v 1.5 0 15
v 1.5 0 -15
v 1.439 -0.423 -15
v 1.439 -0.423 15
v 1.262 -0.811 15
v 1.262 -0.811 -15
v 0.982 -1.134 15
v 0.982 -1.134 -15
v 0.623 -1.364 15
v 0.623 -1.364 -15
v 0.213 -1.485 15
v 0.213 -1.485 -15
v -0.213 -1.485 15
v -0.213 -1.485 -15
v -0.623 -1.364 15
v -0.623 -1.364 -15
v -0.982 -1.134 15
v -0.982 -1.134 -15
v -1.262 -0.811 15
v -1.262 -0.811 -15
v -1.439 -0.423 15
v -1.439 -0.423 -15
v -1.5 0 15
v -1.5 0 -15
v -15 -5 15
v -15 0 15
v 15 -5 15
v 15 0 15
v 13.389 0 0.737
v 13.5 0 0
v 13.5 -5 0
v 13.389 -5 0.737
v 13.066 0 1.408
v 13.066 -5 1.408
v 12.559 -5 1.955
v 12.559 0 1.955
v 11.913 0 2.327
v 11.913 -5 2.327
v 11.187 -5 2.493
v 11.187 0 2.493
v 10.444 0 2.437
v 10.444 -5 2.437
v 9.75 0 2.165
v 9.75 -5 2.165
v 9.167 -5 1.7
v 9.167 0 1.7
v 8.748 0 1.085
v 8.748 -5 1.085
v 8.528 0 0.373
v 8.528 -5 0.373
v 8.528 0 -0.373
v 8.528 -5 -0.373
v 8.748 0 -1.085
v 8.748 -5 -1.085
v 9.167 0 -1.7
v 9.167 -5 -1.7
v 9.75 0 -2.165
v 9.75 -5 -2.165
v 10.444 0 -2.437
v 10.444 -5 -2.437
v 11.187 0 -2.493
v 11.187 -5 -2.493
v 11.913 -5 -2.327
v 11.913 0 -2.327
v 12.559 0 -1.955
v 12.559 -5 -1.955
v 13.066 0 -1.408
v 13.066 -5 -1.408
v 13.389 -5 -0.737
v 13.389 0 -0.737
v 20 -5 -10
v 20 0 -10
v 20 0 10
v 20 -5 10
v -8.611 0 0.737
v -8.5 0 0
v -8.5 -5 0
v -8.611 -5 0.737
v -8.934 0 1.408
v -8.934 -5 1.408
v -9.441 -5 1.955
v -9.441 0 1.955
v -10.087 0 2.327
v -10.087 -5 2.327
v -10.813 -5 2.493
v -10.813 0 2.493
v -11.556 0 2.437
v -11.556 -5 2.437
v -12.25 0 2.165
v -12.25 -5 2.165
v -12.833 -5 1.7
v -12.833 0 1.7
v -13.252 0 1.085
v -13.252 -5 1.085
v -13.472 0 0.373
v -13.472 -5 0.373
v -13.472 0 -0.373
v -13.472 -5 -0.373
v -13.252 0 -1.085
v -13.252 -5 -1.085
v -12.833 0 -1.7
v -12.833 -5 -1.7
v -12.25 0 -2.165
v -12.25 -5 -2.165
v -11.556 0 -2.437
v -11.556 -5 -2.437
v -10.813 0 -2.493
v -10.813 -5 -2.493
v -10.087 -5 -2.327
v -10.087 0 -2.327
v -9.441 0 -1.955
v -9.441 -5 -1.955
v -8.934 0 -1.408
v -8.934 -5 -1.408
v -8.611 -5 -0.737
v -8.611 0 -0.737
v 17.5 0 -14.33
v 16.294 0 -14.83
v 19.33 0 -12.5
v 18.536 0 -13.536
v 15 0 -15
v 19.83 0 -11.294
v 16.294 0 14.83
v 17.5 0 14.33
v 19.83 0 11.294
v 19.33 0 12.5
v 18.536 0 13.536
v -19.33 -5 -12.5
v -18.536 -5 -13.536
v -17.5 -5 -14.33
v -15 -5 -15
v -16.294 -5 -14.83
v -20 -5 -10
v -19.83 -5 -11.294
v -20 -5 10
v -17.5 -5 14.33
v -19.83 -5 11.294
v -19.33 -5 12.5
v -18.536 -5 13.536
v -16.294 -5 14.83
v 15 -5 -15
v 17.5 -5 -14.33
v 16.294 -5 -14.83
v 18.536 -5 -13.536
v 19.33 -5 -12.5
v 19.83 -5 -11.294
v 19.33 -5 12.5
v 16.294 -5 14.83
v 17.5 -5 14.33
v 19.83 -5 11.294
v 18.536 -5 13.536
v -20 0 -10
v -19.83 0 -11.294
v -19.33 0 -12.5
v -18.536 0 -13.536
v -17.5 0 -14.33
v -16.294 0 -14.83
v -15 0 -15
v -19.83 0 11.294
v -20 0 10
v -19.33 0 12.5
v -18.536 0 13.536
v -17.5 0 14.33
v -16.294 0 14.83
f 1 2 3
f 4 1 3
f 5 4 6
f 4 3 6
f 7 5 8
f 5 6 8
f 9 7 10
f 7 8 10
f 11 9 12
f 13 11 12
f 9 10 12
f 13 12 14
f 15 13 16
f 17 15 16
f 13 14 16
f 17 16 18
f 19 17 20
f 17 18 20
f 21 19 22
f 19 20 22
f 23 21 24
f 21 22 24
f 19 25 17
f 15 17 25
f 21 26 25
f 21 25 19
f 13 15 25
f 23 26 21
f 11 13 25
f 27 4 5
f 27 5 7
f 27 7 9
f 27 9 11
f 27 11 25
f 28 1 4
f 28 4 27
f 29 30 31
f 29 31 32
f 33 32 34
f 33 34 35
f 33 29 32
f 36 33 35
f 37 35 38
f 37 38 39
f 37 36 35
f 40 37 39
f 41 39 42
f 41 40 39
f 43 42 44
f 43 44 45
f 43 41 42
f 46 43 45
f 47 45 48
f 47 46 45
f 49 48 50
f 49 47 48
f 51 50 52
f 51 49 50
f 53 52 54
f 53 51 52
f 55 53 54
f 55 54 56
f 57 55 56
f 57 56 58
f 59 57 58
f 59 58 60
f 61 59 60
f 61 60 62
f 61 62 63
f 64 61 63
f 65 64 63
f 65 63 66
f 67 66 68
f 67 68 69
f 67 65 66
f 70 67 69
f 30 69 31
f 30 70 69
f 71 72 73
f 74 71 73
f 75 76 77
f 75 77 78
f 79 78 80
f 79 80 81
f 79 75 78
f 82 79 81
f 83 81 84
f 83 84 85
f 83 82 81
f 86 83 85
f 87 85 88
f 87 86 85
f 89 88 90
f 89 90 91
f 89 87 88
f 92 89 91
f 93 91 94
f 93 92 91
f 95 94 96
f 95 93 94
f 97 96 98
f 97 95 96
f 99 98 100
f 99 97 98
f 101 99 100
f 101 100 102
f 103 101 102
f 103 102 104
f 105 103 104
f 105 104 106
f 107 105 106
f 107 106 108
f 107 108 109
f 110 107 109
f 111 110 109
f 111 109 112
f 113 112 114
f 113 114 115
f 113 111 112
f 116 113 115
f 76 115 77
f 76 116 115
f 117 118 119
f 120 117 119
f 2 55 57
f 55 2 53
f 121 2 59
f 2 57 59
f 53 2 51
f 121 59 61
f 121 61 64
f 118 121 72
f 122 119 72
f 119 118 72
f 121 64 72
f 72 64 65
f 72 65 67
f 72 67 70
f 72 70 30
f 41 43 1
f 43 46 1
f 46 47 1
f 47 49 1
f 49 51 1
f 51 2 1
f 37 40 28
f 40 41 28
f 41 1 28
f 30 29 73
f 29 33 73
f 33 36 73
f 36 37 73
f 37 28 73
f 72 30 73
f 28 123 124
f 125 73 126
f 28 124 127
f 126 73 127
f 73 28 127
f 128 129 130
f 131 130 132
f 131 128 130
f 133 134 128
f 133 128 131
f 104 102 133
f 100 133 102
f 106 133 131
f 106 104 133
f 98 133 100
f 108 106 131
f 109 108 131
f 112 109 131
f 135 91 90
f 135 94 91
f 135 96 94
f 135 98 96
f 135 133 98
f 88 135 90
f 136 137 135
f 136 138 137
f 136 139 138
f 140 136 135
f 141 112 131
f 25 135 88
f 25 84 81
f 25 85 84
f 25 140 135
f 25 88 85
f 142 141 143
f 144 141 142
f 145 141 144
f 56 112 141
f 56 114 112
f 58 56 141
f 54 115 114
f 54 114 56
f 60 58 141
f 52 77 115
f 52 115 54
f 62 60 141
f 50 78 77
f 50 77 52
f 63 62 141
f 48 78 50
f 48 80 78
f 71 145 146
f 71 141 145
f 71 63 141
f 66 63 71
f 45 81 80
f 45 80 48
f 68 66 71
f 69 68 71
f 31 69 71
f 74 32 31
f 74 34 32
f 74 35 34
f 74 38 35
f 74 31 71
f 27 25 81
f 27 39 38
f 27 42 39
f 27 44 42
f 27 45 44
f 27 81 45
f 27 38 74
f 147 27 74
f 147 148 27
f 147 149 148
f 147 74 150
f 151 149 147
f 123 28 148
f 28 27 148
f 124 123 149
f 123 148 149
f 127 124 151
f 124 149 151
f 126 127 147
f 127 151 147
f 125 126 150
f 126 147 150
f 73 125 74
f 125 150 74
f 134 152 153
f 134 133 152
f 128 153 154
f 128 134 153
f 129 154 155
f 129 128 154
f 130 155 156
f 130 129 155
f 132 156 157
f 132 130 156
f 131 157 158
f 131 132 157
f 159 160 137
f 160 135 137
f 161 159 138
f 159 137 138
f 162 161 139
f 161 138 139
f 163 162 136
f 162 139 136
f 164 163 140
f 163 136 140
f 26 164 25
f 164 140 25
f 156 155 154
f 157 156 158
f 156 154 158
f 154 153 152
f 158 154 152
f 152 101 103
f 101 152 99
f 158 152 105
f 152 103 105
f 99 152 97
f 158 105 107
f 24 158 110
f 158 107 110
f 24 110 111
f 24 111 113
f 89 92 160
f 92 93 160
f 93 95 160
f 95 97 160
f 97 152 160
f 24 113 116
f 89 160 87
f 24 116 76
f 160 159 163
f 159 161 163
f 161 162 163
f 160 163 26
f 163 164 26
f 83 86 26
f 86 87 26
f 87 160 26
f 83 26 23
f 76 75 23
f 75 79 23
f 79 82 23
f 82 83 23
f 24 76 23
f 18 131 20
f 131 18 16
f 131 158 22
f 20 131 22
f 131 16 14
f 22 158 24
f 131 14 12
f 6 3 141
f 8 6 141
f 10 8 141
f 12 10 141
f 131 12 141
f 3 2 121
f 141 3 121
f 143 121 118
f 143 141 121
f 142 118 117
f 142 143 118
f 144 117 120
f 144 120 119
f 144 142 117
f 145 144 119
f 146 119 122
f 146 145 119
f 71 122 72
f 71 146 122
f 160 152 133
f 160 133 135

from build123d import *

# Parameters (mm, degrees)
F0_W     = 40
F0_H     = 30
F0_R     = 2.5
F1_DEPTH = 5
F3_DEPTH = 31
F4_R     = 5


with BuildPart() as f1:
    # F0 (on Front) → F1 (new body)
    with BuildSketch(Plane.XZ):
        Rectangle(F0_W, F0_H)
        with Locations((-11, 0)):
            Circle(F0_R, mode=Mode.SUBTRACT)
        with Locations((11, 0)):
            Circle(F0_R, mode=Mode.SUBTRACT)
    extrude(amount=F1_DEPTH)

    # F2 (on face) → F3 (cut)
    with BuildSketch(Plane(origin=(0, 0, -15), x_dir=(1, 0, 0), z_dir=(0, 0, -1))):
        with BuildLine():
            Line((-1.5, 0), (1.5, 0))
            ThreePointArc((1.5, 0), (0, 1.5), (-1.5, 0))
        make_face()
    extrude(amount=-F3_DEPTH, mode=Mode.SUBTRACT)

    # F4
    f4_edges = [f1.edges().sort_by_distance(p)[0] for p in [
        (20, -2.5, -15),
        (-20, -2.5, -15),
        (20, -2.5, 15),
        (-20, -2.5, 15),
    ]]
    fillet(f4_edges, radius=F4_R)


solid = f1.part
